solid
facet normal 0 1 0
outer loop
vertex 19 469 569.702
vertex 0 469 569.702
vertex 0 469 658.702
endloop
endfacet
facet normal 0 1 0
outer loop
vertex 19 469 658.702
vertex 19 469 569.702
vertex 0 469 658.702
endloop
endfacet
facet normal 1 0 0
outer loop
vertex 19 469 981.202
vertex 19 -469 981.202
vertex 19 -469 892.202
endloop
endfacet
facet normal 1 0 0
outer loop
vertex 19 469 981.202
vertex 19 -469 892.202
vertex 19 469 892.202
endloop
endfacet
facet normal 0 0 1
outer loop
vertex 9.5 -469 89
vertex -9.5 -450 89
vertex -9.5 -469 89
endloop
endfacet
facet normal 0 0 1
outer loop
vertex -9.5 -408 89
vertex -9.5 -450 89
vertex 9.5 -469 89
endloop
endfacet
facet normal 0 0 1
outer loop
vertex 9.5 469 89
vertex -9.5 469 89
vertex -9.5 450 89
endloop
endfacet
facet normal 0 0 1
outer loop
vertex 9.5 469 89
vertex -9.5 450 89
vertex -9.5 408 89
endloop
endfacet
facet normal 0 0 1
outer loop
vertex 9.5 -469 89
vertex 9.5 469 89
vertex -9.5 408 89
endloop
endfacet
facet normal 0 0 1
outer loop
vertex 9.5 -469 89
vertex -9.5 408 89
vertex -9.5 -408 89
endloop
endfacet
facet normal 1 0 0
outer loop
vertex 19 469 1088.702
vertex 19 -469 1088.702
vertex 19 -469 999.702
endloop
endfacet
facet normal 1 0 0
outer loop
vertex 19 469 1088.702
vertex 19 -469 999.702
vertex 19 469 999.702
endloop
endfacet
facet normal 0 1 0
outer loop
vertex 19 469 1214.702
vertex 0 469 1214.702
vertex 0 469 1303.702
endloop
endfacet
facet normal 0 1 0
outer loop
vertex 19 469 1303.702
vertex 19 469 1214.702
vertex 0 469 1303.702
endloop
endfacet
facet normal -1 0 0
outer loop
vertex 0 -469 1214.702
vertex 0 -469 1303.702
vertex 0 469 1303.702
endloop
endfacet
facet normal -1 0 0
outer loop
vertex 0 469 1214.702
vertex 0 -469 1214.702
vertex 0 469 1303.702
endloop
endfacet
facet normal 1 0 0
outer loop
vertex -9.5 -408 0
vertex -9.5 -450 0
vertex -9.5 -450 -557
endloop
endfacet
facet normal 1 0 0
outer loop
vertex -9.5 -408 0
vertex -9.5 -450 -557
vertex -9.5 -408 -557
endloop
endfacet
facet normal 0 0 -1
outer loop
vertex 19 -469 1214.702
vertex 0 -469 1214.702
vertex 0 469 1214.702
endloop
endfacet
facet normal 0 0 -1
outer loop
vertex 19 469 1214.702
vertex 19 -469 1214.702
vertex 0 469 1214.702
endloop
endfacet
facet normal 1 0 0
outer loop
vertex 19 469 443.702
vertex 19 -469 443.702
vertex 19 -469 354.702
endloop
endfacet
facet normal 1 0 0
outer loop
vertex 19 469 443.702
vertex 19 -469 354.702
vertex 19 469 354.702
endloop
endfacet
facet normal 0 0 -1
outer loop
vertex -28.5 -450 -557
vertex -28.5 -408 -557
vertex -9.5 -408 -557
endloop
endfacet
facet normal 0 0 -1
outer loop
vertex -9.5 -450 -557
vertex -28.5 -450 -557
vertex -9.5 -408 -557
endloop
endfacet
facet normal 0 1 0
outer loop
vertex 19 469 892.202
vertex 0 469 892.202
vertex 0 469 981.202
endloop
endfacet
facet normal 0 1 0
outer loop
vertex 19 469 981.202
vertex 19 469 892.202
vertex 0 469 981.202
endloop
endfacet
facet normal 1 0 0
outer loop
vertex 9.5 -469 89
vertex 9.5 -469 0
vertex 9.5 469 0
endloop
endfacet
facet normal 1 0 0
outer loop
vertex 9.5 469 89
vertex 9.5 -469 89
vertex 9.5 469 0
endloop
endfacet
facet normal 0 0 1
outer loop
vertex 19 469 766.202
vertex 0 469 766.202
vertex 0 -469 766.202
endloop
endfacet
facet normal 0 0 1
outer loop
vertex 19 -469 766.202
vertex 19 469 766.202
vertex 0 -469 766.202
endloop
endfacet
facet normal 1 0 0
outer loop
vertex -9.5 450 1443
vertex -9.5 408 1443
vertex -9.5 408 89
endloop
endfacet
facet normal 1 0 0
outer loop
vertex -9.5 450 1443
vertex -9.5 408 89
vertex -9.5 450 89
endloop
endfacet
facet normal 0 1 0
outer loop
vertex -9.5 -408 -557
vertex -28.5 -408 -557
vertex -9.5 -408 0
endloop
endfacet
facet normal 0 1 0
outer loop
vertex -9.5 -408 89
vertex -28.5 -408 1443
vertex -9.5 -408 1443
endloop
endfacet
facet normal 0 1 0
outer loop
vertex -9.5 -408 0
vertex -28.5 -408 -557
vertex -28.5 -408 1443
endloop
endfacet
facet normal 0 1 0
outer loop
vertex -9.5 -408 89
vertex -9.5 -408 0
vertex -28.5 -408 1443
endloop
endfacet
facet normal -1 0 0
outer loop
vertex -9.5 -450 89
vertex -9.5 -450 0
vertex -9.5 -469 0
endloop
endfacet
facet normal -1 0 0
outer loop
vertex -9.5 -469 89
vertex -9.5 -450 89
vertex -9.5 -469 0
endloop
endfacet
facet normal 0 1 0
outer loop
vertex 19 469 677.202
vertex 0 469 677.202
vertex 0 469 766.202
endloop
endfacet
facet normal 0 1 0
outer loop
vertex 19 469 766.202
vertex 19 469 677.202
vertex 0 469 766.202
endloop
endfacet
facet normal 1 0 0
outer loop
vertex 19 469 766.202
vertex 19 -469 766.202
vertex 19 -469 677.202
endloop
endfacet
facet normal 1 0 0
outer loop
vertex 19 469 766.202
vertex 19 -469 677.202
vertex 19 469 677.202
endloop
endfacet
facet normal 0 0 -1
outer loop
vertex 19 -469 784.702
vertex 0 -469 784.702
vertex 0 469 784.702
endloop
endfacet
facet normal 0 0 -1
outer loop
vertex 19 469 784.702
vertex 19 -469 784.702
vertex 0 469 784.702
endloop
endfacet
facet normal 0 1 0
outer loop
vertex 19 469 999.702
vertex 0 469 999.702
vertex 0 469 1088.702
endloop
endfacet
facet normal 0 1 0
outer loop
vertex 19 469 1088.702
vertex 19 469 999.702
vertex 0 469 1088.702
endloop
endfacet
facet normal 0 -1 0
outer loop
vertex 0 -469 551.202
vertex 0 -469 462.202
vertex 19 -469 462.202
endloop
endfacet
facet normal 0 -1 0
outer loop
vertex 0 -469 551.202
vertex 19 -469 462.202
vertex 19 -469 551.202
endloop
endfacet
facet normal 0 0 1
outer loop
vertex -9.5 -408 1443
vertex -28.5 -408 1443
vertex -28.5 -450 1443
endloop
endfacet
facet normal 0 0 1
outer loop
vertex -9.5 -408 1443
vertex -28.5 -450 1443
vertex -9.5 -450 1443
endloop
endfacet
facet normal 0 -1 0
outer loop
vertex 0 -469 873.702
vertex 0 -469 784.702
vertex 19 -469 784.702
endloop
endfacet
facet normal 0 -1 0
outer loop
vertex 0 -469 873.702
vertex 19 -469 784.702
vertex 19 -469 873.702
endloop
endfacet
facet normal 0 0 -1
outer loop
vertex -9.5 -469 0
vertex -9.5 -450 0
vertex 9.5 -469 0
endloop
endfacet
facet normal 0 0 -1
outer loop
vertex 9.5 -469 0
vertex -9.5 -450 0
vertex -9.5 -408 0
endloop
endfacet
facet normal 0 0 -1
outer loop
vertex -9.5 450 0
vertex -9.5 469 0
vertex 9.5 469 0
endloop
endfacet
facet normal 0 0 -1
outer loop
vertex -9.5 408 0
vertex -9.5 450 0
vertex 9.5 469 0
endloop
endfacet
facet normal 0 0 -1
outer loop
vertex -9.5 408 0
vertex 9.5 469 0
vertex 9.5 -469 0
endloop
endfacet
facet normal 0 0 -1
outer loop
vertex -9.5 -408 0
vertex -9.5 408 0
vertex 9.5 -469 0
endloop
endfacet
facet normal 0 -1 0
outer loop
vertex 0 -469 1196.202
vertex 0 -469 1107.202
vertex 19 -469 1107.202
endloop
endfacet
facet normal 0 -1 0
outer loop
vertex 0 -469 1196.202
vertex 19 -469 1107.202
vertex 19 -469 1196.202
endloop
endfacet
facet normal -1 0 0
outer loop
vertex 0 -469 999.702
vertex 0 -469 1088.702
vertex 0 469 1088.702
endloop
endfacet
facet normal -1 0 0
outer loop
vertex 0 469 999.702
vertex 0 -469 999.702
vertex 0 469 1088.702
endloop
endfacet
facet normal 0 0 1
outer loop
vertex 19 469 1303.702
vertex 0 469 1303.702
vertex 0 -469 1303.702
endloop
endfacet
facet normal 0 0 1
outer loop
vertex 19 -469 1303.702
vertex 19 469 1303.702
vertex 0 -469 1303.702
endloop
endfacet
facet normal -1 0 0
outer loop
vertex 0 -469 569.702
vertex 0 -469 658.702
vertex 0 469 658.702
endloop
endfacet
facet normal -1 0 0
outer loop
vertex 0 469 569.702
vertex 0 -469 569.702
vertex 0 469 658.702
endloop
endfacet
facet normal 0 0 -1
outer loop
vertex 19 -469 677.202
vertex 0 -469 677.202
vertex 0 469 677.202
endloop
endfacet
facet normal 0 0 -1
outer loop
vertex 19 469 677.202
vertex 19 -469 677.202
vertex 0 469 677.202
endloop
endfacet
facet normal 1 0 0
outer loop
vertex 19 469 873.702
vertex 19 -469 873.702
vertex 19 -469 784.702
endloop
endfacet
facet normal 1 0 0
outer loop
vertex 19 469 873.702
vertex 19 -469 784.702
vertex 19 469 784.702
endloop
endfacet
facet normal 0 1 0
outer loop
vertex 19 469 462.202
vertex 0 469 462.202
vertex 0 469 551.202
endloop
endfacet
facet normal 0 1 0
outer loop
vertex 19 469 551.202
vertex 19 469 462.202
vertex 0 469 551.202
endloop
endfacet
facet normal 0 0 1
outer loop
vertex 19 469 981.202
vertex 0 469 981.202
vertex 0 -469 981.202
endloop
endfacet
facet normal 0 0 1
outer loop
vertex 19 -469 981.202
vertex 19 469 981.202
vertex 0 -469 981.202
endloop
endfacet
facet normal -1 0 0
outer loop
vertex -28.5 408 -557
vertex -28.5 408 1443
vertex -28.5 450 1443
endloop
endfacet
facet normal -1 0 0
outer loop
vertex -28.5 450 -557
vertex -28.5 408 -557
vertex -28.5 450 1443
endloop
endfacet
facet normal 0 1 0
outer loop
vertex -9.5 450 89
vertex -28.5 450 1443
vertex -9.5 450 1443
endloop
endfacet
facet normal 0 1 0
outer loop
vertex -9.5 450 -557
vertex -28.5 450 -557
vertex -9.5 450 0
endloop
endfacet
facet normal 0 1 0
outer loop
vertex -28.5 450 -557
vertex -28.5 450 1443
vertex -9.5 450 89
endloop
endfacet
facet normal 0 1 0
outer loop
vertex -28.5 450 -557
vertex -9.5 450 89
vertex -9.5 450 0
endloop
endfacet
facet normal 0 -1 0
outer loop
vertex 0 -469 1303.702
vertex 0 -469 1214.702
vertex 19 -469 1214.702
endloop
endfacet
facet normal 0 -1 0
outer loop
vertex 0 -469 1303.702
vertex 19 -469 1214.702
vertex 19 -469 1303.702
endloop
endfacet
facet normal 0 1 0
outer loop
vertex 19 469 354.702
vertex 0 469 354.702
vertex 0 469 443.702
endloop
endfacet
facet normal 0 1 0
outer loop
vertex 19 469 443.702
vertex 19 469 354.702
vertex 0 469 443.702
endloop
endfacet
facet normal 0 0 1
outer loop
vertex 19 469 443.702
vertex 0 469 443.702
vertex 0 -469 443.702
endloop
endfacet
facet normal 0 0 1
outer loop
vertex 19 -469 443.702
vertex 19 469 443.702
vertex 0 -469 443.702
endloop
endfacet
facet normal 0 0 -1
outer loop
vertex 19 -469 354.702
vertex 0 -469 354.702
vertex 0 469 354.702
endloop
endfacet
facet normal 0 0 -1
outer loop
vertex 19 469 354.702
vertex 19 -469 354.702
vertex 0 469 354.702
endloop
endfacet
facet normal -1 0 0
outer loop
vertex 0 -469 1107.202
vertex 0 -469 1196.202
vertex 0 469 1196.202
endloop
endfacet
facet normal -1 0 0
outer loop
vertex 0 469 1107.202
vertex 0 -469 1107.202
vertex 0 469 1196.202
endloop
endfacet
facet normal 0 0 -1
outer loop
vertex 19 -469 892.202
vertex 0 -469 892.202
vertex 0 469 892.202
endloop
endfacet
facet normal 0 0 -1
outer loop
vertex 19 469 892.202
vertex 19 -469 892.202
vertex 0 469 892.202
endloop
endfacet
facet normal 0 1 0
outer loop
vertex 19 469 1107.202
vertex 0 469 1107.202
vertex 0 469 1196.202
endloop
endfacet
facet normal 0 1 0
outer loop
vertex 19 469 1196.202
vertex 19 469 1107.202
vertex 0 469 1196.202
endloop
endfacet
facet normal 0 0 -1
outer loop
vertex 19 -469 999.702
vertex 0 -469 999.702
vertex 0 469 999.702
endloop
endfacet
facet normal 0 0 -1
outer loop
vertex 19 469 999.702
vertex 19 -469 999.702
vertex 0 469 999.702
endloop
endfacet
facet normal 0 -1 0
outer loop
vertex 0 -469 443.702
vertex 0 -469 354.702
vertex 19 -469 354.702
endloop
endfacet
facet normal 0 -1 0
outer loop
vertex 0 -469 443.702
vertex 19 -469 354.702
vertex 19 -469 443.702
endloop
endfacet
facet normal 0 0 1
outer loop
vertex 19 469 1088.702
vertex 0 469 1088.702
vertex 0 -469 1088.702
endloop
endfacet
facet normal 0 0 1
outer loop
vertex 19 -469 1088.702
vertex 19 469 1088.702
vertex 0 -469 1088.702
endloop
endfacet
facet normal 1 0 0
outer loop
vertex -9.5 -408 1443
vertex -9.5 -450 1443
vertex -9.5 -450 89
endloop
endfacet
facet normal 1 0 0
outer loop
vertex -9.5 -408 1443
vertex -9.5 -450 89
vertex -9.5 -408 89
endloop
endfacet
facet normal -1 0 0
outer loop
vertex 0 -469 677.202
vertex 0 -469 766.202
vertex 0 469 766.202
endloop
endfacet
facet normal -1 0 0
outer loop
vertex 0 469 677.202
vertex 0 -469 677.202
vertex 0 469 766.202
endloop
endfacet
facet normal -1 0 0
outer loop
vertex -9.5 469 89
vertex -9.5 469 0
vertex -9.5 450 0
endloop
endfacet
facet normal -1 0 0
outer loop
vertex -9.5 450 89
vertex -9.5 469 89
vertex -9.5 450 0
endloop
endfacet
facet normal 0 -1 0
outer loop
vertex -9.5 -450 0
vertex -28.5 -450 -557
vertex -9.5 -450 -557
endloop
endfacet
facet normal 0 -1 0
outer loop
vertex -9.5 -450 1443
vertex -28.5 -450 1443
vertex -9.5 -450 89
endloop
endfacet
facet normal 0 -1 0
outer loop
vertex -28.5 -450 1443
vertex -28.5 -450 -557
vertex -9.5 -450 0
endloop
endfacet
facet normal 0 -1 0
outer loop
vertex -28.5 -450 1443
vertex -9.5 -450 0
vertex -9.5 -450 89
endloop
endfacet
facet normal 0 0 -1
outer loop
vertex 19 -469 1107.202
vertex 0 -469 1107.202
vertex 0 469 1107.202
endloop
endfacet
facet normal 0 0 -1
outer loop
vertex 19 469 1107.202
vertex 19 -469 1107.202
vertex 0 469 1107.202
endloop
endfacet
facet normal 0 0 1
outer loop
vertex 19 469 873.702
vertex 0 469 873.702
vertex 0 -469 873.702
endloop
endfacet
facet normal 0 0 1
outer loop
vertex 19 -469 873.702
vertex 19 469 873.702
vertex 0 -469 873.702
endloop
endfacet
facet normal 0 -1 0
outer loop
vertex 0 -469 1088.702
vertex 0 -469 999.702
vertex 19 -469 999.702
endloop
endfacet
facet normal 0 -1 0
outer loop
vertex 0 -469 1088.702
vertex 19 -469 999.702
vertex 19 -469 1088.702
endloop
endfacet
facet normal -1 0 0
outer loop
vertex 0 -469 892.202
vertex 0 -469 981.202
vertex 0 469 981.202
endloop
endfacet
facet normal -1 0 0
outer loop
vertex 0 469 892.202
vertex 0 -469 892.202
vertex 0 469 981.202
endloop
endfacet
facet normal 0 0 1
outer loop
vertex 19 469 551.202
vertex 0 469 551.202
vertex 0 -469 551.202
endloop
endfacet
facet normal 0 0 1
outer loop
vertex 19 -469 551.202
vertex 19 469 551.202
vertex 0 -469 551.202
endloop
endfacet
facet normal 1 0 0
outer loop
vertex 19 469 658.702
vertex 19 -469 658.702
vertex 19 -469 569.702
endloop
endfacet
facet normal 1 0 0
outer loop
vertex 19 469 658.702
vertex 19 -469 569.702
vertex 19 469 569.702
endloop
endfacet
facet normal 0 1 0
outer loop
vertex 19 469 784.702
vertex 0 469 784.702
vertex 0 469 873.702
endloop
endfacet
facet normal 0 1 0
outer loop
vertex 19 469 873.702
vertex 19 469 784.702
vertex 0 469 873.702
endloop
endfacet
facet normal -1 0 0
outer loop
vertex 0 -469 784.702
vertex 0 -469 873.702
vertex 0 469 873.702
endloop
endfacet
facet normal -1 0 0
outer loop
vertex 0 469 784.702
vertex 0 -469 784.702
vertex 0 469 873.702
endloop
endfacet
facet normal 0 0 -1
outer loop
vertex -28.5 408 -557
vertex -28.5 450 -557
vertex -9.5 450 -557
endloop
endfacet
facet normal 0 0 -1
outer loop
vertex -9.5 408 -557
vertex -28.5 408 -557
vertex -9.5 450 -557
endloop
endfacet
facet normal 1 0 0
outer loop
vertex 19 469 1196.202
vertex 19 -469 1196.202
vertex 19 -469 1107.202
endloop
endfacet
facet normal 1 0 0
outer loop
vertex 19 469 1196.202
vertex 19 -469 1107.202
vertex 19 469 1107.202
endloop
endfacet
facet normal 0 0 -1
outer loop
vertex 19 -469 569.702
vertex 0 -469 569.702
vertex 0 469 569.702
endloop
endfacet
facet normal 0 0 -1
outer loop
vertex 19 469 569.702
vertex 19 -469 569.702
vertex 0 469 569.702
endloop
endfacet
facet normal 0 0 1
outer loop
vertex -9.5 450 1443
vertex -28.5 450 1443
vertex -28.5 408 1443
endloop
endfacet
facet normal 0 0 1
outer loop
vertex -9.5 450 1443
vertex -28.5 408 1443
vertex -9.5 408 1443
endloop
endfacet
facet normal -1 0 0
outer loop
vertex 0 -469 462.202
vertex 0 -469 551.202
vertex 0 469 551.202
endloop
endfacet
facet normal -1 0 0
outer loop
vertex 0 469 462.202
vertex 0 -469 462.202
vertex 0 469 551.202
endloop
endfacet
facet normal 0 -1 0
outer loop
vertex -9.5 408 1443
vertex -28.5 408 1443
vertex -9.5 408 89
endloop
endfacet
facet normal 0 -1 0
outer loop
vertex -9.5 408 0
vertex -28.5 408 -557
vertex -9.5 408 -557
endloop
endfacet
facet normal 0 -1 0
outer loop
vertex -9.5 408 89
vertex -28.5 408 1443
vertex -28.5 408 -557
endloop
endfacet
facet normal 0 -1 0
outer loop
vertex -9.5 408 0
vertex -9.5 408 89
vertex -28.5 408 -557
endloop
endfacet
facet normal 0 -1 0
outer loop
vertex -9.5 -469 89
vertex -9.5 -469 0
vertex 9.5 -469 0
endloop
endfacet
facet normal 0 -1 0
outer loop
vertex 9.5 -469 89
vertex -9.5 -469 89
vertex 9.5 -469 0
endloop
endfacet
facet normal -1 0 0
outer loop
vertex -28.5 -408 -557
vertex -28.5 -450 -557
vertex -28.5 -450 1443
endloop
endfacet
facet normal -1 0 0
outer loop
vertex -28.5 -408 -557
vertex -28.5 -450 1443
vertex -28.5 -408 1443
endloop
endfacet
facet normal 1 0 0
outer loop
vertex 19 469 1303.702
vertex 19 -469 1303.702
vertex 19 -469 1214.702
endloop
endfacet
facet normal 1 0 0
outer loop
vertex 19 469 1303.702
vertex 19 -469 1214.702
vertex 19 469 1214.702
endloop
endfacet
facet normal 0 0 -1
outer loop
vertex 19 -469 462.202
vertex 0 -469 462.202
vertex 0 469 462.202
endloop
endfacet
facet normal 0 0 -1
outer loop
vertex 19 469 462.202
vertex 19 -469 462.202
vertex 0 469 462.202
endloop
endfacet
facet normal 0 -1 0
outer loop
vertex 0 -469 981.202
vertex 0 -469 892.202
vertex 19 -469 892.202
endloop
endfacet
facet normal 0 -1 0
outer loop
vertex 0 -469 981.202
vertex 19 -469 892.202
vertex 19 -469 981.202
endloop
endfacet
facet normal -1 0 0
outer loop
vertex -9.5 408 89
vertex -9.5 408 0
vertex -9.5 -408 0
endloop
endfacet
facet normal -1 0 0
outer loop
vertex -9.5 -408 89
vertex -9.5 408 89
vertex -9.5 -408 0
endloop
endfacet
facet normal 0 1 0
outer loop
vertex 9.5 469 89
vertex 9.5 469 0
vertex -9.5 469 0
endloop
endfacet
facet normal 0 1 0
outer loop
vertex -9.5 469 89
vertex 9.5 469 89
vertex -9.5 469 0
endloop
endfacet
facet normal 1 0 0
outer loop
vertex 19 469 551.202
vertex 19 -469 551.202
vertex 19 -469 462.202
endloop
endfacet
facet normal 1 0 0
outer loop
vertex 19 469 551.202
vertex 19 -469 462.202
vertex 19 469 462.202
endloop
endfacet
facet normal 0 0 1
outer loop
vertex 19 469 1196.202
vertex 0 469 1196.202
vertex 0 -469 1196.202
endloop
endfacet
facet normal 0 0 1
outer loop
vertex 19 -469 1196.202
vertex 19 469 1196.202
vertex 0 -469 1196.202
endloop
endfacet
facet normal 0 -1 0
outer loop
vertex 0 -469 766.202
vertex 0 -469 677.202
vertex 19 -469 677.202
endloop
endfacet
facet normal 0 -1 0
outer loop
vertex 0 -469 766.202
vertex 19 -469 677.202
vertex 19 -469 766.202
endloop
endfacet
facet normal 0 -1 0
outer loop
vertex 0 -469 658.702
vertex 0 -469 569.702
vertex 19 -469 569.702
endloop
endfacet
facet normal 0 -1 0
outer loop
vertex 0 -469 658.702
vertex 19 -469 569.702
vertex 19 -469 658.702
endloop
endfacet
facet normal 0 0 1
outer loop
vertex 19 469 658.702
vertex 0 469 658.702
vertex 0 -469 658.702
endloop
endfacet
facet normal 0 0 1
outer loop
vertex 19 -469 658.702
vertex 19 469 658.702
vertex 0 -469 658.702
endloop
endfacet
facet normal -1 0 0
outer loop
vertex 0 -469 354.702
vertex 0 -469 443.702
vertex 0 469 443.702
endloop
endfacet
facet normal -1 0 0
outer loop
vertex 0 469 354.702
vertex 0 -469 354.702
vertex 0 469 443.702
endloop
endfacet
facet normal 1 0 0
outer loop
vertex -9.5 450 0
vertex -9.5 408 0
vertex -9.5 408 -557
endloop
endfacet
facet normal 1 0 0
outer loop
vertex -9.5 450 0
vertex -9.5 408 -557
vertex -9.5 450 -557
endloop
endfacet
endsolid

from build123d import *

# Parameters (mm, degrees)
F0_W     = 19
F0_H     = 42
F1_DEPTH = 89
F2_DEPTH = 557
F3_DEPTH = 2000
F4_W     = 469
F4_H     = 89
F5_DEPTH = 19


# Not quite as in the source:
# - a feature names something its author has since deleted; it is built from what else it names


with BuildPart() as f1:
    # F0 (on Top) → F1 (new body)
    with BuildSketch(Plane.XY):
        Polygon((-9.5, -469), (9.5, -469), (9.5, 469), (-9.5, 469), (-9.5, 450), (-9.5, 408), (-9.5, -408), (-9.5, -450), align=None)
        with Locations((-19, -429)):
            Rectangle(F0_W, F0_H)
        with Locations((-19, 429)):
            Rectangle(F0_W, F0_H)
    extrude(amount=F1_DEPTH)

    # F0 (on Top) → F2 (join)
    with BuildSketch(Plane.XY):
        with Locations((-19, -429)):
            Rectangle(F0_W, F0_H)
        with Locations((-19, 429)):
            Rectangle(F0_W, F0_H)
    extrude(amount=-F2_DEPTH)

    # F3 (add): faces of the model
    f3_faces = [f1.faces().sort_by_distance(p)[0] for p in [
        (-19, 429, -557),
        (-19, -429, -557),
    ]]
    extrude(f3_faces, amount=-F3_DEPTH)


with BuildPart() as f5:
    # F4 (on Right) → F5 (new body)
    with BuildSketch(Plane.YZ):
        Polygon((64.7416710854, 443.7016204007), (0, 443.7016204007), (0, 354.7016204007), (469, 354.7016204007), (469, 443.7016204007), align=None)
        with Locations((-234.5, 399.2016204007)):
            Rectangle(F4_W, F4_H)
    extrude(amount=F5_DEPTH)


with BuildPart() as f5b:
    # F4 (on Right) → F5, piece 2 (new body)
    with BuildSketch(Plane.YZ):
        Polygon((51.5239238739, 551.2016204007), (0, 551.2016204007), (0, 462.2016204007), (64.7416710854, 462.2016204007), (469, 462.2016204007), (469, 551.2016204007), align=None)
        with Locations((-234.5, 506.7016204007)):
            Rectangle(F4_W, F4_H)
    extrude(amount=F5_DEPTH)


with BuildPart() as f5c:
    # F4 (on Right) → F5, piece 3 (new body)
    with BuildSketch(Plane.YZ):
        Polygon((59.0889453888, 658.7016204007), (0, 658.7016204007), (0, 569.7016204007), (51.5239238739, 569.7016204007), (469, 569.7016204007), (469, 658.7016204007), align=None)
        with Locations((-234.5, 614.2016204007)):
            Rectangle(F4_W, F4_H)
    extrude(amount=F5_DEPTH)


with BuildPart() as f5d:
    # F4 (on Right) → F5, piece 4 (new body)
    with BuildSketch(Plane.YZ):
        with Locations((-234.5, 1259.2016204007)):
            Rectangle(F4_W, F4_H)
        Polygon((0, 1303.7016204007), (0, 1214.7016204007), (46.117246151, 1214.7016204007), (469, 1214.7016204007), (469, 1303.7016204007), align=None)
    extrude(amount=F5_DEPTH)


with BuildPart() as f5e:
    # F4 (on Right) → F5, piece 5 (new body)
    with BuildSketch(Plane.YZ):
        with Locations((-234.5, 1151.7016204007)):
            Rectangle(F4_W, F4_H)
        Polygon((0, 1196.2016204007), (0, 1107.2016204007), (34.1612100601, 1107.2016204007), (469, 1107.2016204007), (469, 1196.2016204007), (46.117246151, 1196.2016204007), align=None)
    extrude(amount=F5_DEPTH)


with BuildPart() as f5f:
    # F4 (on Right) → F5, piece 6 (new body)
    with BuildSketch(Plane.YZ):
        with Locations((-234.5, 1044.2016204007)):
            Rectangle(F4_W, F4_H)
        Polygon((0, 1088.7016204007), (0, 999.7016204007), (44.2955195904, 999.7016204007), (469, 999.7016204007), (469, 1088.7016204007), (34.1612100601, 1088.7016204007), align=None)
    extrude(amount=F5_DEPTH)


with BuildPart() as f5g:
    # F4 (on Right) → F5, piece 7 (new body)
    with BuildSketch(Plane.YZ):
        with Locations((-234.5, 936.7016204007)):
            Rectangle(F4_W, F4_H)
        Polygon((0, 981.2016204007), (0, 892.2016204007), (57.986497879, 892.2016204007), (469, 892.2016204007), (469, 981.2016204007), (44.2955195904, 981.2016204007), align=None)
    extrude(amount=F5_DEPTH)


with BuildPart() as f5h:
    # F4 (on Right) → F5, piece 8 (new body)
    with BuildSketch(Plane.YZ):
        with Locations((-234.5, 829.2016204007)):
            Rectangle(F4_W, F4_H)
        Polygon((0, 873.7016204007), (0, 784.7016204007), (90.5175209045, 784.7016204007), (469, 784.7016204007), (469, 873.7016204007), (57.986497879, 873.7016204007), align=None)
    extrude(amount=F5_DEPTH)


with BuildPart() as f5i:
    # F4 (on Right) → F5, piece 9 (new body)
    with BuildSketch(Plane.YZ):
        with Locations((-234.5, 721.7016204007)):
            Rectangle(F4_W, F4_H)
        Polygon((0, 766.2016204007), (0, 677.2016204007), (59.0889453888, 677.2016204007), (469, 677.2016204007), (469, 766.2016204007), (90.5175209045, 766.2016204007), align=None)
    extrude(amount=F5_DEPTH)


solid = Compound([f1.part, f5.part, f5b.part, f5c.part, f5d.part, f5e.part, f5f.part, f5g.part, f5h.part, f5i.part])
